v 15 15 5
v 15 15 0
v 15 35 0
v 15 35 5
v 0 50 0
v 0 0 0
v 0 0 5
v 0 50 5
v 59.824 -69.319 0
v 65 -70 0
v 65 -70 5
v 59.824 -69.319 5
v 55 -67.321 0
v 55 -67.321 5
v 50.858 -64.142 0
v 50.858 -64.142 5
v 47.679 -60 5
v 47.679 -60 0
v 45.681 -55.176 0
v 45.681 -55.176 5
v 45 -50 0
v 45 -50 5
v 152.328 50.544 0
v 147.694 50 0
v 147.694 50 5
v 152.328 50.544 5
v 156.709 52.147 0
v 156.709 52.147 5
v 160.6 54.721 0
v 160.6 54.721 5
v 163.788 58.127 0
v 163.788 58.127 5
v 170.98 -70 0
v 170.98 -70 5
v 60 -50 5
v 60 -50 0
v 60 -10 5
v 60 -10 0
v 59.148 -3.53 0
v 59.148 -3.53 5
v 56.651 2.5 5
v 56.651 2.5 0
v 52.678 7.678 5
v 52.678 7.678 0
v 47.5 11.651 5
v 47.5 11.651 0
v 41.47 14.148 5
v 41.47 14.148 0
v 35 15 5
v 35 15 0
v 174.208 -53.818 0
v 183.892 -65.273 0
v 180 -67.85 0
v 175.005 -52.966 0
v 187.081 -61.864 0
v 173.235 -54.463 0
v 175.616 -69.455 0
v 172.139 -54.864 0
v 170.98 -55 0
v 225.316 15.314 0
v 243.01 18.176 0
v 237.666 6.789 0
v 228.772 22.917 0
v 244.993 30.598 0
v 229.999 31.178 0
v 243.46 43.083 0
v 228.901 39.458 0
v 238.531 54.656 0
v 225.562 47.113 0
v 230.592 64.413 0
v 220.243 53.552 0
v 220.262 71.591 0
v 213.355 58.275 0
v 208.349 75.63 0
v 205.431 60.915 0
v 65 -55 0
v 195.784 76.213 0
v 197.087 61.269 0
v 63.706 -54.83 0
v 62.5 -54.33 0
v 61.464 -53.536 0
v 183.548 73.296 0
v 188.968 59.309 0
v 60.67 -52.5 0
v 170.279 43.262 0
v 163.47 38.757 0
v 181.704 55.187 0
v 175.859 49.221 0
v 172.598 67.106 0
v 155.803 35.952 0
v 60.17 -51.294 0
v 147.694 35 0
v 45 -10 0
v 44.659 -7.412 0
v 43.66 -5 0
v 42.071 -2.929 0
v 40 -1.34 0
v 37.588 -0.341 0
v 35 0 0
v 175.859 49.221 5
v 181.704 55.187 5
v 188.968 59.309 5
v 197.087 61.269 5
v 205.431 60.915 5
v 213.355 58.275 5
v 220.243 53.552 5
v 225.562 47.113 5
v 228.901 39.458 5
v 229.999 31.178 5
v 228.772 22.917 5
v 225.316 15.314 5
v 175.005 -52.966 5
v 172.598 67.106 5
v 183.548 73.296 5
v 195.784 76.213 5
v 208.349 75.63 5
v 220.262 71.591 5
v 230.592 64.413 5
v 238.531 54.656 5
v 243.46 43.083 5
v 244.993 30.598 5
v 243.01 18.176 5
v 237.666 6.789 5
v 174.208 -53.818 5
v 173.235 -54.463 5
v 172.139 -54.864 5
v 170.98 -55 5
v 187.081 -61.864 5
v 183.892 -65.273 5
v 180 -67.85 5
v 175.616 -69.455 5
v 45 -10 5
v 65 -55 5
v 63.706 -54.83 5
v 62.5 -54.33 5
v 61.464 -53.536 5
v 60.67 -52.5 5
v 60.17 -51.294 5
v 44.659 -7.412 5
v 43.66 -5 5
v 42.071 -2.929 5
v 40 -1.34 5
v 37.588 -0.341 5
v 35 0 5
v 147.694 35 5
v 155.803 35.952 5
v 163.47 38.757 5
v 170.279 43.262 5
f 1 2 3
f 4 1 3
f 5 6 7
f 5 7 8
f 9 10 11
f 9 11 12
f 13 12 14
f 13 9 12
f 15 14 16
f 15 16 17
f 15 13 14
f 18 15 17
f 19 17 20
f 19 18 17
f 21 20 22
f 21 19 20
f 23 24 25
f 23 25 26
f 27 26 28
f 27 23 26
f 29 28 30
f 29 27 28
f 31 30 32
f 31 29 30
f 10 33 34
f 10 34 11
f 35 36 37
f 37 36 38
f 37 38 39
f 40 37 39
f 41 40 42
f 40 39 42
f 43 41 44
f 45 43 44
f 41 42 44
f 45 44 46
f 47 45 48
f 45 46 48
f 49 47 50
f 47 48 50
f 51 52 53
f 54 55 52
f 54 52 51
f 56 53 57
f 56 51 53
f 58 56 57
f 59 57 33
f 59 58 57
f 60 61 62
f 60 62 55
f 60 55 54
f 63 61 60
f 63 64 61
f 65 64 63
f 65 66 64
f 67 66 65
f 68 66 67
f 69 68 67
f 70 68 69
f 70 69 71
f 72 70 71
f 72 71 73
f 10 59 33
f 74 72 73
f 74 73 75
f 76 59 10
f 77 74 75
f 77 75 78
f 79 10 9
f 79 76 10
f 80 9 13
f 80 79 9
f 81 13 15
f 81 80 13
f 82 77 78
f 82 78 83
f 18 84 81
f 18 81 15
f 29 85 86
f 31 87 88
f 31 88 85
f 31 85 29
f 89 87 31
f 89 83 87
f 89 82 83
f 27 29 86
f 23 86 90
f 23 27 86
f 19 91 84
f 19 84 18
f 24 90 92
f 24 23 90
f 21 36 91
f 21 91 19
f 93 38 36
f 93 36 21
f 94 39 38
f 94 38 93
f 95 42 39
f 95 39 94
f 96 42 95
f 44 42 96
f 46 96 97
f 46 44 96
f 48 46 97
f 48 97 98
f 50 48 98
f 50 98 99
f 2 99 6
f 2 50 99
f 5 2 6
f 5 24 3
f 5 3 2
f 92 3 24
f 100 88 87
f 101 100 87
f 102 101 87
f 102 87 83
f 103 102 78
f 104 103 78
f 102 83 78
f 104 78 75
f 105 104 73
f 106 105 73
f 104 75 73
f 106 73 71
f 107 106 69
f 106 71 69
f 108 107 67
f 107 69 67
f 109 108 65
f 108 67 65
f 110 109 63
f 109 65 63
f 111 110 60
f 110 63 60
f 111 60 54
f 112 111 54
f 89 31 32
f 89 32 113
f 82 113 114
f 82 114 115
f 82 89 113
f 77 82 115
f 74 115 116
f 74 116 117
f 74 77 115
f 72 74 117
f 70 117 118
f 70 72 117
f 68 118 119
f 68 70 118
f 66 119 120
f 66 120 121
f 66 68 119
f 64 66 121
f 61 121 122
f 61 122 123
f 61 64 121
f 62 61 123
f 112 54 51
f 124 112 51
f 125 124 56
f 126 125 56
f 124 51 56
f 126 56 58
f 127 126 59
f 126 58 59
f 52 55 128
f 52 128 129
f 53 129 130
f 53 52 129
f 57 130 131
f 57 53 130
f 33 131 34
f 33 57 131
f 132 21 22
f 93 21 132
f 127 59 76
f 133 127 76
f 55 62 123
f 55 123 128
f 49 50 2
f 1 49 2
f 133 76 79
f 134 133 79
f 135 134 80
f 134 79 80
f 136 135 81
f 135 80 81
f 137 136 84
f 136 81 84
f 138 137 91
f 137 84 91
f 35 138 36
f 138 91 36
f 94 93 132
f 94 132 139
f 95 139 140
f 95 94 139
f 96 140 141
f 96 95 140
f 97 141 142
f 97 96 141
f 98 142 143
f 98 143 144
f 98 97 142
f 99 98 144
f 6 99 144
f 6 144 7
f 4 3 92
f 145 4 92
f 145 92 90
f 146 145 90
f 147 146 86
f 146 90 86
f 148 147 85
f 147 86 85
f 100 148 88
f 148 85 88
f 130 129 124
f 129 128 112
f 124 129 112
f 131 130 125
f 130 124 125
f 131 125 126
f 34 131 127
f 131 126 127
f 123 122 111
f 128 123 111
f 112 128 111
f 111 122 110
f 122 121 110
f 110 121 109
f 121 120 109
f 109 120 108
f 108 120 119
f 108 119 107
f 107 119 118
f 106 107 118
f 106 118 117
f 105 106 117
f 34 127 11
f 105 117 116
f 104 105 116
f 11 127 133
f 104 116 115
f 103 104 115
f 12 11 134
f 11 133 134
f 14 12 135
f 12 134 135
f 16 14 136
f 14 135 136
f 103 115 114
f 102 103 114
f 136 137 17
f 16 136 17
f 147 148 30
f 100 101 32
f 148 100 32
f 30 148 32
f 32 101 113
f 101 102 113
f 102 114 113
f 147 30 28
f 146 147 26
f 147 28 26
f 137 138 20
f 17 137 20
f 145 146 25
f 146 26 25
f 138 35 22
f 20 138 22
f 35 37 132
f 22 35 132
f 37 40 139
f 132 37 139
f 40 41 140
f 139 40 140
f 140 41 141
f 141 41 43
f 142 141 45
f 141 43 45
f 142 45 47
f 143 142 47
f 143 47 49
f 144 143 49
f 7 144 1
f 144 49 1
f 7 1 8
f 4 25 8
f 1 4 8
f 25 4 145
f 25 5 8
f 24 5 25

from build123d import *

# Parameters (mm, degrees)
BOSS_EXTRUDE1_DEPTH = 5


with BuildPart() as part:
    # Sketch2 → Boss-Extrude1 (new body)
    with BuildSketch(Plane.XY):
        with BuildLine():
            Line((0, 0), (0, 50))
            Line((0, 50), (147.694165659, 50))
            ThreePointArc((147.694165659, 50), (156.708879353, 52.146850782), (163.788268533, 58.126506299))
            ThreePointArc((163.788268533, 58.126506299), (225.679200393, 68.364882321), (237.666102591, 6.788702139))
            Line((237.666102591, 6.788702139), (187.081159294, -61.863810699))
            ThreePointArc((187.081159294, -61.863810699), (180, -67.850437165), (170.979917239, -70))
            Line((170.979917239, -70), (65, -70))
            ThreePointArc((65, -70), (50.857864376, -64.142135624), (45, -50))
            Line((45, -50), (45, -10))
            ThreePointArc((45, -10), (42.071067812, -2.928932188), (35, 0))
            Line((35, 0), (0, 0))
        make_face()
        with BuildLine():
            Line((15, 35), (147.694165659, 35))
            ThreePointArc((147.694165659, 35), (163.469914624, 38.756988868), (175.858845689, 49.221386023))
            ThreePointArc((175.858845689, 49.221386023), (216.96392633, 56.154330461), (225.315559898, 15.313865357))
            Line((225.315559898, 15.313865357), (175.005227753, -52.965952675))
            ThreePointArc((175.005227753, -52.965952675), (173.23493793, -54.462609291), (170.979917239, -55))
            Line((170.979917239, -55), (65, -55))
            ThreePointArc((65, -55), (61.464466094, -53.535533906), (60, -50))
            Line((60, -50), (60, -10))
            ThreePointArc((60, -10), (52.67766953, 7.67766953), (35, 15))
            Line((35, 15), (15, 15))
            Line((15, 15), (15, 35))
        make_face(mode=Mode.SUBTRACT)
    extrude(amount=BOSS_EXTRUDE1_DEPTH)


solid = part.part
